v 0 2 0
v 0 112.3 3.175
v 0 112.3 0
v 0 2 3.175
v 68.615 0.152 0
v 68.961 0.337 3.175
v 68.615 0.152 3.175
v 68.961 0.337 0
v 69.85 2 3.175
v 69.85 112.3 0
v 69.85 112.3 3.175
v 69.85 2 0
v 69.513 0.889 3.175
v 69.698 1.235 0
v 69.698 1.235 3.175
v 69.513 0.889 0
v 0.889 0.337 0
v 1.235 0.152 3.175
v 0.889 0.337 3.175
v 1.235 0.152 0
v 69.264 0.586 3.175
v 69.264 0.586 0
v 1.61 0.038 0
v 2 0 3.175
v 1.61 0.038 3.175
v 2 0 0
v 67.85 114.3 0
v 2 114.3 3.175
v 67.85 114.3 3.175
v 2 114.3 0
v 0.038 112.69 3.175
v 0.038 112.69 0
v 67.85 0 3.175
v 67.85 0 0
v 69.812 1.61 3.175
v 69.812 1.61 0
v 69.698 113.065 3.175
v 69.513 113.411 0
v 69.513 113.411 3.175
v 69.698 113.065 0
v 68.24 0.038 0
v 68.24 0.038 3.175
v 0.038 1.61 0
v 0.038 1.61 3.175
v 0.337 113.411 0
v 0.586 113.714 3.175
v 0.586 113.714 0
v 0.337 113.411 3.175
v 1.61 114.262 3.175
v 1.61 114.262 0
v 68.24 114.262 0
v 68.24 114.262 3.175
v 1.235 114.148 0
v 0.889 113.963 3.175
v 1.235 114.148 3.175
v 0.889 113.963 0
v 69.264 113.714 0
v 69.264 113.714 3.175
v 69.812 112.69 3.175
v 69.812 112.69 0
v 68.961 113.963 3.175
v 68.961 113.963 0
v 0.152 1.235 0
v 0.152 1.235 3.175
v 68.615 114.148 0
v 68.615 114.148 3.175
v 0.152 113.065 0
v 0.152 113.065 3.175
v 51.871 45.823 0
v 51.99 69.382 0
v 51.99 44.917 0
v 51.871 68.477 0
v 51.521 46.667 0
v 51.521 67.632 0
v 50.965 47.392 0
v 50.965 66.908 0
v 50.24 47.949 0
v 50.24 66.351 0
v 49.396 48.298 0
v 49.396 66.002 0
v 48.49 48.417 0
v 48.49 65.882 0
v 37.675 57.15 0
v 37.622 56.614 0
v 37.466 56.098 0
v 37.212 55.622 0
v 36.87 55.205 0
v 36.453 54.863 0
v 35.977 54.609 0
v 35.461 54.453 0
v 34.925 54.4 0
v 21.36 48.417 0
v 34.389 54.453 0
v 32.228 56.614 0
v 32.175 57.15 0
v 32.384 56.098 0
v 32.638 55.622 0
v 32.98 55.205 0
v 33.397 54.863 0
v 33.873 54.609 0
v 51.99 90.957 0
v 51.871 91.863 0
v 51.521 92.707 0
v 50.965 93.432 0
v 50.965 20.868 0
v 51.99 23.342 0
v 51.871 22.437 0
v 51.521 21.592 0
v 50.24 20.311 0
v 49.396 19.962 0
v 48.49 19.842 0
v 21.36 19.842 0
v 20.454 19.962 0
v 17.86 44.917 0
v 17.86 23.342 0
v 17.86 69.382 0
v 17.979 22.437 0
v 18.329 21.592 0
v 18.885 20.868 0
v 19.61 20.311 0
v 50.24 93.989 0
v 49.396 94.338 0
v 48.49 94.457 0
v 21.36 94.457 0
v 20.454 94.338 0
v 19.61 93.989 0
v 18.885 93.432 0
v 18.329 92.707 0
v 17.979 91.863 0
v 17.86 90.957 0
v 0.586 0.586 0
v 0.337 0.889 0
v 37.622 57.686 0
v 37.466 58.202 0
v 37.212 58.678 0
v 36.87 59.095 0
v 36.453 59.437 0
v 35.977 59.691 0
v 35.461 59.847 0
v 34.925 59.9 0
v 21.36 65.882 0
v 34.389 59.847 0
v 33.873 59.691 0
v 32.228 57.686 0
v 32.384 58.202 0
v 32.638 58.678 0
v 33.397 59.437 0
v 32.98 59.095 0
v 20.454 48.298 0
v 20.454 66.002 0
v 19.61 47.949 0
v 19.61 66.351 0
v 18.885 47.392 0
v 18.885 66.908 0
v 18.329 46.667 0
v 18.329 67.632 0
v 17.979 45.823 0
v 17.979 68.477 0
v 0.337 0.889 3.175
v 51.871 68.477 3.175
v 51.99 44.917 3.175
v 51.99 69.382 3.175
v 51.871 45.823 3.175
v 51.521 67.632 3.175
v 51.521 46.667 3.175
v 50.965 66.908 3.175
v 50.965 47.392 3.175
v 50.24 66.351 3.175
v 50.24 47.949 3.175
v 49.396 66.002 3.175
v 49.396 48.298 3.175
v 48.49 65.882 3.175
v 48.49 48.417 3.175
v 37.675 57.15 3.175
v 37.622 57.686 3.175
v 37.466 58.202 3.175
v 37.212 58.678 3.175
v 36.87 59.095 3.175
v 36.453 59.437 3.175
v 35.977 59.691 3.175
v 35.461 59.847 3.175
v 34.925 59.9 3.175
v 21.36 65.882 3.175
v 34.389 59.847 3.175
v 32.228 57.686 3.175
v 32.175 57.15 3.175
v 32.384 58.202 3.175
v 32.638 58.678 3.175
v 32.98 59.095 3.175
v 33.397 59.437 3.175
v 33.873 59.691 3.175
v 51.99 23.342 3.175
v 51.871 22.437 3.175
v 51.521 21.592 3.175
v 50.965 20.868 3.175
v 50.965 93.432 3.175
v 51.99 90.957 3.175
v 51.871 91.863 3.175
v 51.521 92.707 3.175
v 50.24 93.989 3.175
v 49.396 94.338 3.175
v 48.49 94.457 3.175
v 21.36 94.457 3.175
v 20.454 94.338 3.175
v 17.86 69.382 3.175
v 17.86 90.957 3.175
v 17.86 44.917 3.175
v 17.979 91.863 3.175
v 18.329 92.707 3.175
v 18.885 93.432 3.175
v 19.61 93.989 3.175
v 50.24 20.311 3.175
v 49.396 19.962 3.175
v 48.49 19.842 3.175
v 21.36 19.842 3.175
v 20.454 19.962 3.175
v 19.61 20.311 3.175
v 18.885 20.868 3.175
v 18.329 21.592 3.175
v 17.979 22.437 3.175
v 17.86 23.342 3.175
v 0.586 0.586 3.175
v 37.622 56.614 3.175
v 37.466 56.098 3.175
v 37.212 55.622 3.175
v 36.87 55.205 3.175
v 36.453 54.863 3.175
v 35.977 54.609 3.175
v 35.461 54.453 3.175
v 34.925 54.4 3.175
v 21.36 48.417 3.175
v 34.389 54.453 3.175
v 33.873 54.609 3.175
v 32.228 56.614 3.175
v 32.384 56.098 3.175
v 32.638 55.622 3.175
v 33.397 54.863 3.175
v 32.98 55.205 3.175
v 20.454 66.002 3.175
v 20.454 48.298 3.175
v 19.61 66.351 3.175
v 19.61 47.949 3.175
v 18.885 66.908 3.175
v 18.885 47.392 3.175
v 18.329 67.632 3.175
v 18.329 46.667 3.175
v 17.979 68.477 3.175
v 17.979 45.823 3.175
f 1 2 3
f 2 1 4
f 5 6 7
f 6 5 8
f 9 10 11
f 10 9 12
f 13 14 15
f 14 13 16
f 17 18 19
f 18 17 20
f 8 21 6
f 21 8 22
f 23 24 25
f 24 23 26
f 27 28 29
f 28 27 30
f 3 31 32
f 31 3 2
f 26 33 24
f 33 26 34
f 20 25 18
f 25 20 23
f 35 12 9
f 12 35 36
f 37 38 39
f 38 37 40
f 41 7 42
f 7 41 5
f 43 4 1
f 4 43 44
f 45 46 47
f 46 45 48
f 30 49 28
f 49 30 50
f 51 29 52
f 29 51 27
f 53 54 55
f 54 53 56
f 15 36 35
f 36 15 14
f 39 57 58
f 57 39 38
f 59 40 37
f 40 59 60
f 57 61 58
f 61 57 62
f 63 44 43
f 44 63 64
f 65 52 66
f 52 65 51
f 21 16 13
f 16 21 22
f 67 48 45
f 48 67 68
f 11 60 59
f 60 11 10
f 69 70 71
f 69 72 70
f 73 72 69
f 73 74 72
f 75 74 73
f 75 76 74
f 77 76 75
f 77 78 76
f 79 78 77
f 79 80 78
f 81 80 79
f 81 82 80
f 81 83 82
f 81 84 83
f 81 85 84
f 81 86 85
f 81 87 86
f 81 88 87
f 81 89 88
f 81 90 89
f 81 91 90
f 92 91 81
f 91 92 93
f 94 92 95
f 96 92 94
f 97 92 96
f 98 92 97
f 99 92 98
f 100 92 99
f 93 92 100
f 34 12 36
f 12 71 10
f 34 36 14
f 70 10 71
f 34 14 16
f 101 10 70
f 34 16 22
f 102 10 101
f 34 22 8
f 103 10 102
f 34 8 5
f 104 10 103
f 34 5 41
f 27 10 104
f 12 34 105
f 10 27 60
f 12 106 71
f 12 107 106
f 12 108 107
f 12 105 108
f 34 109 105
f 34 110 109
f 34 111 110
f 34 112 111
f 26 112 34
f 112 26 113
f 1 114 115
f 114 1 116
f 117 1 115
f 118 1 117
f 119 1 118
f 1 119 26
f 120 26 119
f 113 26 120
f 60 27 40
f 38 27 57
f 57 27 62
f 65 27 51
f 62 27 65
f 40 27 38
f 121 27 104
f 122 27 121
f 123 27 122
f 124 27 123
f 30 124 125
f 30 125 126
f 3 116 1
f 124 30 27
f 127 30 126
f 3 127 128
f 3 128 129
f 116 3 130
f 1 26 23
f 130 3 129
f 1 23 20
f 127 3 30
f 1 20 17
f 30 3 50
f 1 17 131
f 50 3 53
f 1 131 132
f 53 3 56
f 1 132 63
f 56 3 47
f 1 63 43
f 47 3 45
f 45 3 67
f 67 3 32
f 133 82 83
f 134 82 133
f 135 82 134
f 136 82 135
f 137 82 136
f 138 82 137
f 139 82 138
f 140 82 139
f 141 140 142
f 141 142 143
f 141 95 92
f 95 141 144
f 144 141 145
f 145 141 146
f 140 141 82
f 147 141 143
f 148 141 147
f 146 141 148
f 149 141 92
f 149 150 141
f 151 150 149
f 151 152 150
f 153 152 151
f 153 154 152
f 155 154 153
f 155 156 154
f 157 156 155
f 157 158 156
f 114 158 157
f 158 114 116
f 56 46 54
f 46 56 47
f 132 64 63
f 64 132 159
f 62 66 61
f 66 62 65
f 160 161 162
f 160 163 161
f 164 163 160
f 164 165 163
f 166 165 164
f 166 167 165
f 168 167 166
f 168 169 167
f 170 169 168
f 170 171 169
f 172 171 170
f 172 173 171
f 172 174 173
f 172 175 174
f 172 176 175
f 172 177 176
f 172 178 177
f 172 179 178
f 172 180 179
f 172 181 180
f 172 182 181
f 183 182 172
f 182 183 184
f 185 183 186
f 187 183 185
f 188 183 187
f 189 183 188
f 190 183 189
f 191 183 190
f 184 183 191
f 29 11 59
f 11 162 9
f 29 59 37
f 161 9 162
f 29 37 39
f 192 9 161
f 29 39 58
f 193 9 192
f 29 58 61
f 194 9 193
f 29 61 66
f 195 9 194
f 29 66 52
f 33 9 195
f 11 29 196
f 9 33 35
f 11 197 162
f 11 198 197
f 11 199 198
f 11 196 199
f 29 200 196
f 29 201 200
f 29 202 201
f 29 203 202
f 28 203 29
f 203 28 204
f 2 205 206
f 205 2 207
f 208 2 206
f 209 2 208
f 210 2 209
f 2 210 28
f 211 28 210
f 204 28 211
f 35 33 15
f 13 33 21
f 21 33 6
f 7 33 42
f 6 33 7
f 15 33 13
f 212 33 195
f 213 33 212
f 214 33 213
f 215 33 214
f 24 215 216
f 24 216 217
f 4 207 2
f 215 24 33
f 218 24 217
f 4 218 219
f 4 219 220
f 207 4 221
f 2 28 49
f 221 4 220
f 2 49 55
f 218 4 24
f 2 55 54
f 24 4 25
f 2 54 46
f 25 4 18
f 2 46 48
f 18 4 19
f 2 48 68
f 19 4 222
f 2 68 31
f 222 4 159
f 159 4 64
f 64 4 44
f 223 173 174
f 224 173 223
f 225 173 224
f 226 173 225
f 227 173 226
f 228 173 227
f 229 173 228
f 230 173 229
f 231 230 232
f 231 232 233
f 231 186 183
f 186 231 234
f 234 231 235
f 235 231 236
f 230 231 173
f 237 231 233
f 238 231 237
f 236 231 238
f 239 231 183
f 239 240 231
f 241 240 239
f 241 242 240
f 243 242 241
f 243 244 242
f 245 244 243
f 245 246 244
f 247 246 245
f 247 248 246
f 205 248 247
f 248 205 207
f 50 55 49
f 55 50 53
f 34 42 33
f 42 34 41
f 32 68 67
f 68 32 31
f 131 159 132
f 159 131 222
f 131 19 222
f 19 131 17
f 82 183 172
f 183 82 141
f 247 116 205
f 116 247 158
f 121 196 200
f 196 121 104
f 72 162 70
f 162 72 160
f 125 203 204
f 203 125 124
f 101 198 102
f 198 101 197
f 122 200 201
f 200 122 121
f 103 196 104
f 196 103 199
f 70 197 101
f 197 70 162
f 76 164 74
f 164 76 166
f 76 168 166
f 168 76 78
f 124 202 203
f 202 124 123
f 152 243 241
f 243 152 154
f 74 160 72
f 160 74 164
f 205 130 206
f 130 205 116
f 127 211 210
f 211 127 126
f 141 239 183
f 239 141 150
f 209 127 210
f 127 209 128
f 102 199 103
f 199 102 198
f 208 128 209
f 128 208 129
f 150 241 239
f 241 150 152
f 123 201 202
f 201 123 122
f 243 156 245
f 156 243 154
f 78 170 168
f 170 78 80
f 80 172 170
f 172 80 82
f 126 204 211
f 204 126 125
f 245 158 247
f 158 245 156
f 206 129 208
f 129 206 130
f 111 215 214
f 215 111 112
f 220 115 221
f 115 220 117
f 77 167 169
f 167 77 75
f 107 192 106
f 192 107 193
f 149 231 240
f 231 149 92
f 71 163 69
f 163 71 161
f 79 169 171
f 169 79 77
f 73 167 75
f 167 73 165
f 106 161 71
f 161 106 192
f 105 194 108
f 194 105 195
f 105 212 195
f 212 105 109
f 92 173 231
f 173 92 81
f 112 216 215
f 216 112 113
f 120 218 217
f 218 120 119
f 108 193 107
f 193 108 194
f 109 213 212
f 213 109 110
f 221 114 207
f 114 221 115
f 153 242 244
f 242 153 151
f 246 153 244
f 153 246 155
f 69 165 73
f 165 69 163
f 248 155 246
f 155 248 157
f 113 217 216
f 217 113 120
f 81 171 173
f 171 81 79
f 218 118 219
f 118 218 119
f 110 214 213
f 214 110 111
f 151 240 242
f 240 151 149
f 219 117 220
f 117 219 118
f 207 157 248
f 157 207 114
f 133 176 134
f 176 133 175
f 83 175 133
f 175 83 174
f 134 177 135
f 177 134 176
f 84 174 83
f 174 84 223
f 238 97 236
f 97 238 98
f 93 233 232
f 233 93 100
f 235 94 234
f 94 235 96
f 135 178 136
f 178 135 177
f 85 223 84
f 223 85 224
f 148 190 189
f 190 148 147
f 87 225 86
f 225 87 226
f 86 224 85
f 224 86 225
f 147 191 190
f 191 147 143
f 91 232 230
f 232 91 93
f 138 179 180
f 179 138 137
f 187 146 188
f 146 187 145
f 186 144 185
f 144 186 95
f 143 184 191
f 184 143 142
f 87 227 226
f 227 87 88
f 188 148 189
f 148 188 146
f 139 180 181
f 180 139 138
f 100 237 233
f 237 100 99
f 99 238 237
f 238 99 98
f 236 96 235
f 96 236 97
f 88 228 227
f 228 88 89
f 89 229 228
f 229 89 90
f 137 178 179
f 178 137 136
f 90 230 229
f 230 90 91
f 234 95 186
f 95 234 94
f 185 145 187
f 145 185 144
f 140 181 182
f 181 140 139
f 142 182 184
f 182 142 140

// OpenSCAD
// Standard US Single-Gang Duplex Outlet Cover Plate
// NEMA 5-15 - Exact real-world dimensions
// No text - clean base plate

// ---- Plate (2.75" x 4.5" x 0.125") ----
pw = 69.85;    // 2.75"
ph = 114.3;    // 4.50"
pt = 3.175;    // 0.125" thick
cr = 2.0;      // corner radius

// ---- Outlet openings ----
// Each: 34.13mm W x 28.575mm H, rounded corners
// Centers 46.04mm apart, centered on plate
ow = 34.13;    // opening width  (1-11/32")
oh = 28.575;   // opening height (1-1/8")
or_ = 3.5;     // opening corner radius
spacing = 46.04; // center-to-center (1-13/16")

cx = pw / 2;
cy = ph / 2;
top_cy = cy + spacing / 2;
bot_cy = cy - spacing / 2;

// ---- Mounting screw hole ----
screw_d = 5.5;

// ---- Modules ----
module rounded_box(w, h, d, r) {
    hull() {
        translate([r, r, 0])     cylinder(r=r, h=d, $fn=32);
        translate([w-r, r, 0])   cylinder(r=r, h=d, $fn=32);
        translate([r, h-r, 0])   cylinder(r=r, h=d, $fn=32);
        translate([w-r, h-r, 0]) cylinder(r=r, h=d, $fn=32);
    }
}

module outlet_opening() {
    translate([-ow/2, -oh/2, -1])
    hull() {
        translate([or_, or_, 0])        cylinder(r=or_, h=pt+2, $fn=24);
        translate([ow-or_, or_, 0])     cylinder(r=or_, h=pt+2, $fn=24);
        translate([or_, oh-or_, 0])     cylinder(r=or_, h=pt+2, $fn=24);
        translate([ow-or_, oh-or_, 0])  cylinder(r=or_, h=pt+2, $fn=24);
    }
}

// ---- Build plate ----
difference() {
    rounded_box(pw, ph, pt, cr);

    // Top outlet opening
    translate([cx, top_cy, 0]) outlet_opening();

    // Bottom outlet opening
    translate([cx, bot_cy, 0]) outlet_opening();

    // Center mounting screw
    translate([cx, cy, -1]) cylinder(d=screw_d, h=pt+2, $fn=32);
}
